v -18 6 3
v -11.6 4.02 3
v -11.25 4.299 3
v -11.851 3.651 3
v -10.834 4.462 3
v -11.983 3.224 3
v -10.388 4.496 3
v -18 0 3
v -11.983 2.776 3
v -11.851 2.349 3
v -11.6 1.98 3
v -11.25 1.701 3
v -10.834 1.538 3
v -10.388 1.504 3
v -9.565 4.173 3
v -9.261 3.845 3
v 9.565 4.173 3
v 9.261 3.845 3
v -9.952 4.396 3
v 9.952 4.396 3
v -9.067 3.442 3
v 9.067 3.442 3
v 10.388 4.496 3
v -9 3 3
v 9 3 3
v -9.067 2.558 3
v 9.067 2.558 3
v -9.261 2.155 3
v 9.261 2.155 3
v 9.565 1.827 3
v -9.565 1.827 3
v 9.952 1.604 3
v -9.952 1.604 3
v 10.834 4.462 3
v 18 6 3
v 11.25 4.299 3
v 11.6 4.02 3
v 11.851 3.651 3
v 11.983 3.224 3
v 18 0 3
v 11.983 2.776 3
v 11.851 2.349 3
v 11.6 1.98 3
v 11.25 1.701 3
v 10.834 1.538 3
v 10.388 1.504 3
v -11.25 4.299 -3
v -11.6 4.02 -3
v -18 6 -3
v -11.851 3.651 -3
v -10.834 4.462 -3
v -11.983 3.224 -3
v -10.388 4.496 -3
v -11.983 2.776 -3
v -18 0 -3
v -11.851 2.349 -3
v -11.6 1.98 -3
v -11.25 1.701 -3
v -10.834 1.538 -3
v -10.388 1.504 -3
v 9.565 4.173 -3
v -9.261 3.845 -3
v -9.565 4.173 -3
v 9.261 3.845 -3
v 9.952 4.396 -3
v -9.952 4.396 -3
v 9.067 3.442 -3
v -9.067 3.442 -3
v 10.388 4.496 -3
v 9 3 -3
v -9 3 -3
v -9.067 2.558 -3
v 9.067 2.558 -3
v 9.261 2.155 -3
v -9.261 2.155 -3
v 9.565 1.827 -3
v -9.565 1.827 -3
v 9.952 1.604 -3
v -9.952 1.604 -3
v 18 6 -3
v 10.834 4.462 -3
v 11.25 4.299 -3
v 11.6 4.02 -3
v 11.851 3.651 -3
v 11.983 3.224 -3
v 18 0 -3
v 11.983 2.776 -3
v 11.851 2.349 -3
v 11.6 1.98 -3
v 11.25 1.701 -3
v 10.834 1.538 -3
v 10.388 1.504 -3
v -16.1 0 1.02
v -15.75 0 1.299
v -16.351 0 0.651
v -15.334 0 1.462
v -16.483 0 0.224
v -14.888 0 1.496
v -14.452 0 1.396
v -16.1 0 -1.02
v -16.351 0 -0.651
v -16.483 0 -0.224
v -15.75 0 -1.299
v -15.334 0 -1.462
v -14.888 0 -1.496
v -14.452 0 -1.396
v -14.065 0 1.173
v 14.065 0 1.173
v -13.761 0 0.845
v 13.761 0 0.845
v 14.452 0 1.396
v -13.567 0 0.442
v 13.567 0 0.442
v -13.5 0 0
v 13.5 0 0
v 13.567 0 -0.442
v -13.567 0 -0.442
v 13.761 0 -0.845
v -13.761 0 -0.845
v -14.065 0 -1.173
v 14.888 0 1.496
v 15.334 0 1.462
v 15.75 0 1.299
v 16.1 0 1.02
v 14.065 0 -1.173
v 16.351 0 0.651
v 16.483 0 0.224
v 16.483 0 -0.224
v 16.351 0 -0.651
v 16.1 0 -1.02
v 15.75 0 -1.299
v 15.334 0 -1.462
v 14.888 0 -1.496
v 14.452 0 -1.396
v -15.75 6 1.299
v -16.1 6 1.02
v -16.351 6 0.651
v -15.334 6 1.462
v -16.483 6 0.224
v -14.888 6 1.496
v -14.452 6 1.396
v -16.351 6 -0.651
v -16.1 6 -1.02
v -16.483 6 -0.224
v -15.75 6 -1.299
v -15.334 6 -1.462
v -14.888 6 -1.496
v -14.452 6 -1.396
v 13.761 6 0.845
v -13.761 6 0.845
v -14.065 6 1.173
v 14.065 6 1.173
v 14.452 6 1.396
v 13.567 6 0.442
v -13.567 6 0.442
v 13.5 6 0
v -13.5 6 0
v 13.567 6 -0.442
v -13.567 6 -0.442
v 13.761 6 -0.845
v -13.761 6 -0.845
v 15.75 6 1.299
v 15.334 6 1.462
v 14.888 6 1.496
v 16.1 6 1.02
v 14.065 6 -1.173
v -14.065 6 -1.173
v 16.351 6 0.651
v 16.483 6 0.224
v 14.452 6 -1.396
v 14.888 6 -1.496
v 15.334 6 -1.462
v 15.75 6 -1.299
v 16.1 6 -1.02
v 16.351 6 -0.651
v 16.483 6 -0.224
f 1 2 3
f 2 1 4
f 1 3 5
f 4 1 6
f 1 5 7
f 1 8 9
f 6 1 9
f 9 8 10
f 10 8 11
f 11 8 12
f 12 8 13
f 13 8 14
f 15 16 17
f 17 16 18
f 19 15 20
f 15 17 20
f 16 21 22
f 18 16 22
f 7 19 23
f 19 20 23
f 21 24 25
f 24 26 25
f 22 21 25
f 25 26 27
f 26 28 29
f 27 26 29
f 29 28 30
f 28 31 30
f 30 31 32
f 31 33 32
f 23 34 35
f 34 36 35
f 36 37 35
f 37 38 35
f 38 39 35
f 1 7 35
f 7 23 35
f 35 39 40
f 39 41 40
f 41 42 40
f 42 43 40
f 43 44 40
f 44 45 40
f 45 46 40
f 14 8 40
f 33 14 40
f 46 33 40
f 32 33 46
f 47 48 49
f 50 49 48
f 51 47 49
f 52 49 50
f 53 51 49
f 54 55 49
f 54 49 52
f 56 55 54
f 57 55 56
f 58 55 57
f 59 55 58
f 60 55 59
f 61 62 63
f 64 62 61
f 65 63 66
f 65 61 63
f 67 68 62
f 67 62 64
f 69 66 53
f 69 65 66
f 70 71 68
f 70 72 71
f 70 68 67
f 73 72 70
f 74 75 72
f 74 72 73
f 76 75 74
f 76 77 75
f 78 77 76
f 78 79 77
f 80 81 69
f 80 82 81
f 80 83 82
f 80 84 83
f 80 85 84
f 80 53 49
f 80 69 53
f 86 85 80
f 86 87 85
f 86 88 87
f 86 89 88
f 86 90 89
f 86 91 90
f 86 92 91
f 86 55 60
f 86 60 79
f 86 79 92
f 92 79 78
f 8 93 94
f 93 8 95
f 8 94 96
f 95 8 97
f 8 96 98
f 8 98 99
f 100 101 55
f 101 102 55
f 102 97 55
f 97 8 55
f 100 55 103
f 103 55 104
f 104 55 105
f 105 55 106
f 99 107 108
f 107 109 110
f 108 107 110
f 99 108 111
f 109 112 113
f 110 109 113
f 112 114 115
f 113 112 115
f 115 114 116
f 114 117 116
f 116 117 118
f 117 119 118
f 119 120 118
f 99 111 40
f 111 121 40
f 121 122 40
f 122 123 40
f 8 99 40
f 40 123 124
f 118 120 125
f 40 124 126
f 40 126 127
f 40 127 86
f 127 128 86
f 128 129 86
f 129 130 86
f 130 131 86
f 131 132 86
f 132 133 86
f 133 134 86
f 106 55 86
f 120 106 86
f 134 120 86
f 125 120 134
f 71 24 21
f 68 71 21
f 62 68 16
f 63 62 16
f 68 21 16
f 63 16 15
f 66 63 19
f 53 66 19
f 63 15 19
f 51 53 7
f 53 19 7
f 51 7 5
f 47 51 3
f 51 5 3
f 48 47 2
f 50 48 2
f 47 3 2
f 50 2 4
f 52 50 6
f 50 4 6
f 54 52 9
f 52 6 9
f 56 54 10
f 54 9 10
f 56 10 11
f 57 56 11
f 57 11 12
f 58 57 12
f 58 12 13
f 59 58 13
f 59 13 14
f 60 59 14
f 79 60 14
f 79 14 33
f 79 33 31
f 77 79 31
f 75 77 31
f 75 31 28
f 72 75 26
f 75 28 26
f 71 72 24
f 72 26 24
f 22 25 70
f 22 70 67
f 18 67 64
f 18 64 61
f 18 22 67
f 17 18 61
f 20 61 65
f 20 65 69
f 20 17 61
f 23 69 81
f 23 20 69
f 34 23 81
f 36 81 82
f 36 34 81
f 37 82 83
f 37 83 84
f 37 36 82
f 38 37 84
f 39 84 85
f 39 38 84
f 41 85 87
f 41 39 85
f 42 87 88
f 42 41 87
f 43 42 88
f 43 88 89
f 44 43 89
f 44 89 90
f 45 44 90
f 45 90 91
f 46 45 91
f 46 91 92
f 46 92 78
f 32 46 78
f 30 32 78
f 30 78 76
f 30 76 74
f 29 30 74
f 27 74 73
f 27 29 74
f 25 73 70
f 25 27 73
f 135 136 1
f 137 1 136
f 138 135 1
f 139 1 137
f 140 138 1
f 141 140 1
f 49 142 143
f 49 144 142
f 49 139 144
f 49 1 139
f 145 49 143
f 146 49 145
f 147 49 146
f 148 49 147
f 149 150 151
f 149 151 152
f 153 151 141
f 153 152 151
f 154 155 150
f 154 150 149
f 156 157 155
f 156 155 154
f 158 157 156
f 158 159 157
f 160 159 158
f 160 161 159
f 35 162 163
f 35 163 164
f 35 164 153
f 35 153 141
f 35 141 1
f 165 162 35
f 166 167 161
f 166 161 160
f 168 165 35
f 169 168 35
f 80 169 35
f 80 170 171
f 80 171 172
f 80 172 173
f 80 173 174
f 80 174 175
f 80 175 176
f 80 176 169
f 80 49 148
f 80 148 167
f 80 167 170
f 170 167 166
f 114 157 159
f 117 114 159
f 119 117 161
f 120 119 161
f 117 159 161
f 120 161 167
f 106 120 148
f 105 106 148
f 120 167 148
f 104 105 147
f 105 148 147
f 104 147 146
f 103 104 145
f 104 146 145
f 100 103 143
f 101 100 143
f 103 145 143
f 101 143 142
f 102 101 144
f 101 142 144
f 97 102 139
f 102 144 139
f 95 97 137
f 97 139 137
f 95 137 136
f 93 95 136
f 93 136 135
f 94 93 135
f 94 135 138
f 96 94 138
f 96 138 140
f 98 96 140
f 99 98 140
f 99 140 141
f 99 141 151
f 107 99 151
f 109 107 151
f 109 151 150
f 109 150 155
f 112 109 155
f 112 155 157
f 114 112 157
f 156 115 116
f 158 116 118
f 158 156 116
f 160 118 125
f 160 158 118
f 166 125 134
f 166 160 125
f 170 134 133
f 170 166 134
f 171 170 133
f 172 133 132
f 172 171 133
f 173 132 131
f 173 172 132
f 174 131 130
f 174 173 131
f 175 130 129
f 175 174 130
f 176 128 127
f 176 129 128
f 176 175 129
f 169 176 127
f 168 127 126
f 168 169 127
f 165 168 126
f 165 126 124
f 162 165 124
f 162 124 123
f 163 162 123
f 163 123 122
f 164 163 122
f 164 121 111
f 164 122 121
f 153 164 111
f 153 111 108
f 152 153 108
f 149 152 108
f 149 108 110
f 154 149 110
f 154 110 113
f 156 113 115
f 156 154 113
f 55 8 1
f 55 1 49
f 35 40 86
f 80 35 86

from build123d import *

# Parameters (mm, degrees)
ESQUISSE1_W             = 36
ESQUISSE1_H             = 6
BOSS_EXTRU_1_DEPTH      = 6
ESQUISSE2_R             = 1.5
ENL_V_MAT_EXTRU_1_DEPTH = 60
ESQUISSE3_R             = 1.5
ENL_V_MAT_EXTRU_2_DEPTH = 6


with BuildPart() as part:
    # Esquisse1 → Boss.-Extru.1 (new body)
    with BuildSketch(Plane(origin=(0, 0, 0), x_dir=(1, 0, 0), z_dir=(0, 1, 0))):
        Rectangle(ESQUISSE1_W, ESQUISSE1_H)
    extrude(amount=BOSS_EXTRU_1_DEPTH)

    # Esquisse2 → Enlèv. mat.-Extru.1 (cut)
    with BuildSketch(Plane(origin=(0, 6, 0), x_dir=(1, 0, 0), z_dir=(0, 1, 0))):
        with Locations((-15, 0)):
            Circle(ESQUISSE2_R)
    enl_v_mat_extru_1 = extrude(amount=-ENL_V_MAT_EXTRU_1_DEPTH, mode=Mode.SUBTRACT)

    # Symétrie1: Enlèv. mat.-Extru.1 across plane
    add(enl_v_mat_extru_1.mirror(Plane(origin=(0, 0, 0), x_dir=(0, 0, 1), z_dir=(1, 0, 0))), mode=Mode.SUBTRACT)

    # Esquisse3 → Enlèv. mat.-Extru.2 (cut)
    with BuildSketch(Plane.XY.offset(3)):
        with Locations((-10.5, 3)):
            Circle(ESQUISSE3_R)
    enl_v_mat_extru_2 = extrude(amount=-ENL_V_MAT_EXTRU_2_DEPTH, mode=Mode.SUBTRACT)

    # Symétrie2: Enlèv. mat.-Extru.2 across plane
    add(enl_v_mat_extru_2.mirror(Plane(origin=(0, 0, 0), x_dir=(0, 0, 1), z_dir=(1, 0, 0))), mode=Mode.SUBTRACT)


solid = part.part
